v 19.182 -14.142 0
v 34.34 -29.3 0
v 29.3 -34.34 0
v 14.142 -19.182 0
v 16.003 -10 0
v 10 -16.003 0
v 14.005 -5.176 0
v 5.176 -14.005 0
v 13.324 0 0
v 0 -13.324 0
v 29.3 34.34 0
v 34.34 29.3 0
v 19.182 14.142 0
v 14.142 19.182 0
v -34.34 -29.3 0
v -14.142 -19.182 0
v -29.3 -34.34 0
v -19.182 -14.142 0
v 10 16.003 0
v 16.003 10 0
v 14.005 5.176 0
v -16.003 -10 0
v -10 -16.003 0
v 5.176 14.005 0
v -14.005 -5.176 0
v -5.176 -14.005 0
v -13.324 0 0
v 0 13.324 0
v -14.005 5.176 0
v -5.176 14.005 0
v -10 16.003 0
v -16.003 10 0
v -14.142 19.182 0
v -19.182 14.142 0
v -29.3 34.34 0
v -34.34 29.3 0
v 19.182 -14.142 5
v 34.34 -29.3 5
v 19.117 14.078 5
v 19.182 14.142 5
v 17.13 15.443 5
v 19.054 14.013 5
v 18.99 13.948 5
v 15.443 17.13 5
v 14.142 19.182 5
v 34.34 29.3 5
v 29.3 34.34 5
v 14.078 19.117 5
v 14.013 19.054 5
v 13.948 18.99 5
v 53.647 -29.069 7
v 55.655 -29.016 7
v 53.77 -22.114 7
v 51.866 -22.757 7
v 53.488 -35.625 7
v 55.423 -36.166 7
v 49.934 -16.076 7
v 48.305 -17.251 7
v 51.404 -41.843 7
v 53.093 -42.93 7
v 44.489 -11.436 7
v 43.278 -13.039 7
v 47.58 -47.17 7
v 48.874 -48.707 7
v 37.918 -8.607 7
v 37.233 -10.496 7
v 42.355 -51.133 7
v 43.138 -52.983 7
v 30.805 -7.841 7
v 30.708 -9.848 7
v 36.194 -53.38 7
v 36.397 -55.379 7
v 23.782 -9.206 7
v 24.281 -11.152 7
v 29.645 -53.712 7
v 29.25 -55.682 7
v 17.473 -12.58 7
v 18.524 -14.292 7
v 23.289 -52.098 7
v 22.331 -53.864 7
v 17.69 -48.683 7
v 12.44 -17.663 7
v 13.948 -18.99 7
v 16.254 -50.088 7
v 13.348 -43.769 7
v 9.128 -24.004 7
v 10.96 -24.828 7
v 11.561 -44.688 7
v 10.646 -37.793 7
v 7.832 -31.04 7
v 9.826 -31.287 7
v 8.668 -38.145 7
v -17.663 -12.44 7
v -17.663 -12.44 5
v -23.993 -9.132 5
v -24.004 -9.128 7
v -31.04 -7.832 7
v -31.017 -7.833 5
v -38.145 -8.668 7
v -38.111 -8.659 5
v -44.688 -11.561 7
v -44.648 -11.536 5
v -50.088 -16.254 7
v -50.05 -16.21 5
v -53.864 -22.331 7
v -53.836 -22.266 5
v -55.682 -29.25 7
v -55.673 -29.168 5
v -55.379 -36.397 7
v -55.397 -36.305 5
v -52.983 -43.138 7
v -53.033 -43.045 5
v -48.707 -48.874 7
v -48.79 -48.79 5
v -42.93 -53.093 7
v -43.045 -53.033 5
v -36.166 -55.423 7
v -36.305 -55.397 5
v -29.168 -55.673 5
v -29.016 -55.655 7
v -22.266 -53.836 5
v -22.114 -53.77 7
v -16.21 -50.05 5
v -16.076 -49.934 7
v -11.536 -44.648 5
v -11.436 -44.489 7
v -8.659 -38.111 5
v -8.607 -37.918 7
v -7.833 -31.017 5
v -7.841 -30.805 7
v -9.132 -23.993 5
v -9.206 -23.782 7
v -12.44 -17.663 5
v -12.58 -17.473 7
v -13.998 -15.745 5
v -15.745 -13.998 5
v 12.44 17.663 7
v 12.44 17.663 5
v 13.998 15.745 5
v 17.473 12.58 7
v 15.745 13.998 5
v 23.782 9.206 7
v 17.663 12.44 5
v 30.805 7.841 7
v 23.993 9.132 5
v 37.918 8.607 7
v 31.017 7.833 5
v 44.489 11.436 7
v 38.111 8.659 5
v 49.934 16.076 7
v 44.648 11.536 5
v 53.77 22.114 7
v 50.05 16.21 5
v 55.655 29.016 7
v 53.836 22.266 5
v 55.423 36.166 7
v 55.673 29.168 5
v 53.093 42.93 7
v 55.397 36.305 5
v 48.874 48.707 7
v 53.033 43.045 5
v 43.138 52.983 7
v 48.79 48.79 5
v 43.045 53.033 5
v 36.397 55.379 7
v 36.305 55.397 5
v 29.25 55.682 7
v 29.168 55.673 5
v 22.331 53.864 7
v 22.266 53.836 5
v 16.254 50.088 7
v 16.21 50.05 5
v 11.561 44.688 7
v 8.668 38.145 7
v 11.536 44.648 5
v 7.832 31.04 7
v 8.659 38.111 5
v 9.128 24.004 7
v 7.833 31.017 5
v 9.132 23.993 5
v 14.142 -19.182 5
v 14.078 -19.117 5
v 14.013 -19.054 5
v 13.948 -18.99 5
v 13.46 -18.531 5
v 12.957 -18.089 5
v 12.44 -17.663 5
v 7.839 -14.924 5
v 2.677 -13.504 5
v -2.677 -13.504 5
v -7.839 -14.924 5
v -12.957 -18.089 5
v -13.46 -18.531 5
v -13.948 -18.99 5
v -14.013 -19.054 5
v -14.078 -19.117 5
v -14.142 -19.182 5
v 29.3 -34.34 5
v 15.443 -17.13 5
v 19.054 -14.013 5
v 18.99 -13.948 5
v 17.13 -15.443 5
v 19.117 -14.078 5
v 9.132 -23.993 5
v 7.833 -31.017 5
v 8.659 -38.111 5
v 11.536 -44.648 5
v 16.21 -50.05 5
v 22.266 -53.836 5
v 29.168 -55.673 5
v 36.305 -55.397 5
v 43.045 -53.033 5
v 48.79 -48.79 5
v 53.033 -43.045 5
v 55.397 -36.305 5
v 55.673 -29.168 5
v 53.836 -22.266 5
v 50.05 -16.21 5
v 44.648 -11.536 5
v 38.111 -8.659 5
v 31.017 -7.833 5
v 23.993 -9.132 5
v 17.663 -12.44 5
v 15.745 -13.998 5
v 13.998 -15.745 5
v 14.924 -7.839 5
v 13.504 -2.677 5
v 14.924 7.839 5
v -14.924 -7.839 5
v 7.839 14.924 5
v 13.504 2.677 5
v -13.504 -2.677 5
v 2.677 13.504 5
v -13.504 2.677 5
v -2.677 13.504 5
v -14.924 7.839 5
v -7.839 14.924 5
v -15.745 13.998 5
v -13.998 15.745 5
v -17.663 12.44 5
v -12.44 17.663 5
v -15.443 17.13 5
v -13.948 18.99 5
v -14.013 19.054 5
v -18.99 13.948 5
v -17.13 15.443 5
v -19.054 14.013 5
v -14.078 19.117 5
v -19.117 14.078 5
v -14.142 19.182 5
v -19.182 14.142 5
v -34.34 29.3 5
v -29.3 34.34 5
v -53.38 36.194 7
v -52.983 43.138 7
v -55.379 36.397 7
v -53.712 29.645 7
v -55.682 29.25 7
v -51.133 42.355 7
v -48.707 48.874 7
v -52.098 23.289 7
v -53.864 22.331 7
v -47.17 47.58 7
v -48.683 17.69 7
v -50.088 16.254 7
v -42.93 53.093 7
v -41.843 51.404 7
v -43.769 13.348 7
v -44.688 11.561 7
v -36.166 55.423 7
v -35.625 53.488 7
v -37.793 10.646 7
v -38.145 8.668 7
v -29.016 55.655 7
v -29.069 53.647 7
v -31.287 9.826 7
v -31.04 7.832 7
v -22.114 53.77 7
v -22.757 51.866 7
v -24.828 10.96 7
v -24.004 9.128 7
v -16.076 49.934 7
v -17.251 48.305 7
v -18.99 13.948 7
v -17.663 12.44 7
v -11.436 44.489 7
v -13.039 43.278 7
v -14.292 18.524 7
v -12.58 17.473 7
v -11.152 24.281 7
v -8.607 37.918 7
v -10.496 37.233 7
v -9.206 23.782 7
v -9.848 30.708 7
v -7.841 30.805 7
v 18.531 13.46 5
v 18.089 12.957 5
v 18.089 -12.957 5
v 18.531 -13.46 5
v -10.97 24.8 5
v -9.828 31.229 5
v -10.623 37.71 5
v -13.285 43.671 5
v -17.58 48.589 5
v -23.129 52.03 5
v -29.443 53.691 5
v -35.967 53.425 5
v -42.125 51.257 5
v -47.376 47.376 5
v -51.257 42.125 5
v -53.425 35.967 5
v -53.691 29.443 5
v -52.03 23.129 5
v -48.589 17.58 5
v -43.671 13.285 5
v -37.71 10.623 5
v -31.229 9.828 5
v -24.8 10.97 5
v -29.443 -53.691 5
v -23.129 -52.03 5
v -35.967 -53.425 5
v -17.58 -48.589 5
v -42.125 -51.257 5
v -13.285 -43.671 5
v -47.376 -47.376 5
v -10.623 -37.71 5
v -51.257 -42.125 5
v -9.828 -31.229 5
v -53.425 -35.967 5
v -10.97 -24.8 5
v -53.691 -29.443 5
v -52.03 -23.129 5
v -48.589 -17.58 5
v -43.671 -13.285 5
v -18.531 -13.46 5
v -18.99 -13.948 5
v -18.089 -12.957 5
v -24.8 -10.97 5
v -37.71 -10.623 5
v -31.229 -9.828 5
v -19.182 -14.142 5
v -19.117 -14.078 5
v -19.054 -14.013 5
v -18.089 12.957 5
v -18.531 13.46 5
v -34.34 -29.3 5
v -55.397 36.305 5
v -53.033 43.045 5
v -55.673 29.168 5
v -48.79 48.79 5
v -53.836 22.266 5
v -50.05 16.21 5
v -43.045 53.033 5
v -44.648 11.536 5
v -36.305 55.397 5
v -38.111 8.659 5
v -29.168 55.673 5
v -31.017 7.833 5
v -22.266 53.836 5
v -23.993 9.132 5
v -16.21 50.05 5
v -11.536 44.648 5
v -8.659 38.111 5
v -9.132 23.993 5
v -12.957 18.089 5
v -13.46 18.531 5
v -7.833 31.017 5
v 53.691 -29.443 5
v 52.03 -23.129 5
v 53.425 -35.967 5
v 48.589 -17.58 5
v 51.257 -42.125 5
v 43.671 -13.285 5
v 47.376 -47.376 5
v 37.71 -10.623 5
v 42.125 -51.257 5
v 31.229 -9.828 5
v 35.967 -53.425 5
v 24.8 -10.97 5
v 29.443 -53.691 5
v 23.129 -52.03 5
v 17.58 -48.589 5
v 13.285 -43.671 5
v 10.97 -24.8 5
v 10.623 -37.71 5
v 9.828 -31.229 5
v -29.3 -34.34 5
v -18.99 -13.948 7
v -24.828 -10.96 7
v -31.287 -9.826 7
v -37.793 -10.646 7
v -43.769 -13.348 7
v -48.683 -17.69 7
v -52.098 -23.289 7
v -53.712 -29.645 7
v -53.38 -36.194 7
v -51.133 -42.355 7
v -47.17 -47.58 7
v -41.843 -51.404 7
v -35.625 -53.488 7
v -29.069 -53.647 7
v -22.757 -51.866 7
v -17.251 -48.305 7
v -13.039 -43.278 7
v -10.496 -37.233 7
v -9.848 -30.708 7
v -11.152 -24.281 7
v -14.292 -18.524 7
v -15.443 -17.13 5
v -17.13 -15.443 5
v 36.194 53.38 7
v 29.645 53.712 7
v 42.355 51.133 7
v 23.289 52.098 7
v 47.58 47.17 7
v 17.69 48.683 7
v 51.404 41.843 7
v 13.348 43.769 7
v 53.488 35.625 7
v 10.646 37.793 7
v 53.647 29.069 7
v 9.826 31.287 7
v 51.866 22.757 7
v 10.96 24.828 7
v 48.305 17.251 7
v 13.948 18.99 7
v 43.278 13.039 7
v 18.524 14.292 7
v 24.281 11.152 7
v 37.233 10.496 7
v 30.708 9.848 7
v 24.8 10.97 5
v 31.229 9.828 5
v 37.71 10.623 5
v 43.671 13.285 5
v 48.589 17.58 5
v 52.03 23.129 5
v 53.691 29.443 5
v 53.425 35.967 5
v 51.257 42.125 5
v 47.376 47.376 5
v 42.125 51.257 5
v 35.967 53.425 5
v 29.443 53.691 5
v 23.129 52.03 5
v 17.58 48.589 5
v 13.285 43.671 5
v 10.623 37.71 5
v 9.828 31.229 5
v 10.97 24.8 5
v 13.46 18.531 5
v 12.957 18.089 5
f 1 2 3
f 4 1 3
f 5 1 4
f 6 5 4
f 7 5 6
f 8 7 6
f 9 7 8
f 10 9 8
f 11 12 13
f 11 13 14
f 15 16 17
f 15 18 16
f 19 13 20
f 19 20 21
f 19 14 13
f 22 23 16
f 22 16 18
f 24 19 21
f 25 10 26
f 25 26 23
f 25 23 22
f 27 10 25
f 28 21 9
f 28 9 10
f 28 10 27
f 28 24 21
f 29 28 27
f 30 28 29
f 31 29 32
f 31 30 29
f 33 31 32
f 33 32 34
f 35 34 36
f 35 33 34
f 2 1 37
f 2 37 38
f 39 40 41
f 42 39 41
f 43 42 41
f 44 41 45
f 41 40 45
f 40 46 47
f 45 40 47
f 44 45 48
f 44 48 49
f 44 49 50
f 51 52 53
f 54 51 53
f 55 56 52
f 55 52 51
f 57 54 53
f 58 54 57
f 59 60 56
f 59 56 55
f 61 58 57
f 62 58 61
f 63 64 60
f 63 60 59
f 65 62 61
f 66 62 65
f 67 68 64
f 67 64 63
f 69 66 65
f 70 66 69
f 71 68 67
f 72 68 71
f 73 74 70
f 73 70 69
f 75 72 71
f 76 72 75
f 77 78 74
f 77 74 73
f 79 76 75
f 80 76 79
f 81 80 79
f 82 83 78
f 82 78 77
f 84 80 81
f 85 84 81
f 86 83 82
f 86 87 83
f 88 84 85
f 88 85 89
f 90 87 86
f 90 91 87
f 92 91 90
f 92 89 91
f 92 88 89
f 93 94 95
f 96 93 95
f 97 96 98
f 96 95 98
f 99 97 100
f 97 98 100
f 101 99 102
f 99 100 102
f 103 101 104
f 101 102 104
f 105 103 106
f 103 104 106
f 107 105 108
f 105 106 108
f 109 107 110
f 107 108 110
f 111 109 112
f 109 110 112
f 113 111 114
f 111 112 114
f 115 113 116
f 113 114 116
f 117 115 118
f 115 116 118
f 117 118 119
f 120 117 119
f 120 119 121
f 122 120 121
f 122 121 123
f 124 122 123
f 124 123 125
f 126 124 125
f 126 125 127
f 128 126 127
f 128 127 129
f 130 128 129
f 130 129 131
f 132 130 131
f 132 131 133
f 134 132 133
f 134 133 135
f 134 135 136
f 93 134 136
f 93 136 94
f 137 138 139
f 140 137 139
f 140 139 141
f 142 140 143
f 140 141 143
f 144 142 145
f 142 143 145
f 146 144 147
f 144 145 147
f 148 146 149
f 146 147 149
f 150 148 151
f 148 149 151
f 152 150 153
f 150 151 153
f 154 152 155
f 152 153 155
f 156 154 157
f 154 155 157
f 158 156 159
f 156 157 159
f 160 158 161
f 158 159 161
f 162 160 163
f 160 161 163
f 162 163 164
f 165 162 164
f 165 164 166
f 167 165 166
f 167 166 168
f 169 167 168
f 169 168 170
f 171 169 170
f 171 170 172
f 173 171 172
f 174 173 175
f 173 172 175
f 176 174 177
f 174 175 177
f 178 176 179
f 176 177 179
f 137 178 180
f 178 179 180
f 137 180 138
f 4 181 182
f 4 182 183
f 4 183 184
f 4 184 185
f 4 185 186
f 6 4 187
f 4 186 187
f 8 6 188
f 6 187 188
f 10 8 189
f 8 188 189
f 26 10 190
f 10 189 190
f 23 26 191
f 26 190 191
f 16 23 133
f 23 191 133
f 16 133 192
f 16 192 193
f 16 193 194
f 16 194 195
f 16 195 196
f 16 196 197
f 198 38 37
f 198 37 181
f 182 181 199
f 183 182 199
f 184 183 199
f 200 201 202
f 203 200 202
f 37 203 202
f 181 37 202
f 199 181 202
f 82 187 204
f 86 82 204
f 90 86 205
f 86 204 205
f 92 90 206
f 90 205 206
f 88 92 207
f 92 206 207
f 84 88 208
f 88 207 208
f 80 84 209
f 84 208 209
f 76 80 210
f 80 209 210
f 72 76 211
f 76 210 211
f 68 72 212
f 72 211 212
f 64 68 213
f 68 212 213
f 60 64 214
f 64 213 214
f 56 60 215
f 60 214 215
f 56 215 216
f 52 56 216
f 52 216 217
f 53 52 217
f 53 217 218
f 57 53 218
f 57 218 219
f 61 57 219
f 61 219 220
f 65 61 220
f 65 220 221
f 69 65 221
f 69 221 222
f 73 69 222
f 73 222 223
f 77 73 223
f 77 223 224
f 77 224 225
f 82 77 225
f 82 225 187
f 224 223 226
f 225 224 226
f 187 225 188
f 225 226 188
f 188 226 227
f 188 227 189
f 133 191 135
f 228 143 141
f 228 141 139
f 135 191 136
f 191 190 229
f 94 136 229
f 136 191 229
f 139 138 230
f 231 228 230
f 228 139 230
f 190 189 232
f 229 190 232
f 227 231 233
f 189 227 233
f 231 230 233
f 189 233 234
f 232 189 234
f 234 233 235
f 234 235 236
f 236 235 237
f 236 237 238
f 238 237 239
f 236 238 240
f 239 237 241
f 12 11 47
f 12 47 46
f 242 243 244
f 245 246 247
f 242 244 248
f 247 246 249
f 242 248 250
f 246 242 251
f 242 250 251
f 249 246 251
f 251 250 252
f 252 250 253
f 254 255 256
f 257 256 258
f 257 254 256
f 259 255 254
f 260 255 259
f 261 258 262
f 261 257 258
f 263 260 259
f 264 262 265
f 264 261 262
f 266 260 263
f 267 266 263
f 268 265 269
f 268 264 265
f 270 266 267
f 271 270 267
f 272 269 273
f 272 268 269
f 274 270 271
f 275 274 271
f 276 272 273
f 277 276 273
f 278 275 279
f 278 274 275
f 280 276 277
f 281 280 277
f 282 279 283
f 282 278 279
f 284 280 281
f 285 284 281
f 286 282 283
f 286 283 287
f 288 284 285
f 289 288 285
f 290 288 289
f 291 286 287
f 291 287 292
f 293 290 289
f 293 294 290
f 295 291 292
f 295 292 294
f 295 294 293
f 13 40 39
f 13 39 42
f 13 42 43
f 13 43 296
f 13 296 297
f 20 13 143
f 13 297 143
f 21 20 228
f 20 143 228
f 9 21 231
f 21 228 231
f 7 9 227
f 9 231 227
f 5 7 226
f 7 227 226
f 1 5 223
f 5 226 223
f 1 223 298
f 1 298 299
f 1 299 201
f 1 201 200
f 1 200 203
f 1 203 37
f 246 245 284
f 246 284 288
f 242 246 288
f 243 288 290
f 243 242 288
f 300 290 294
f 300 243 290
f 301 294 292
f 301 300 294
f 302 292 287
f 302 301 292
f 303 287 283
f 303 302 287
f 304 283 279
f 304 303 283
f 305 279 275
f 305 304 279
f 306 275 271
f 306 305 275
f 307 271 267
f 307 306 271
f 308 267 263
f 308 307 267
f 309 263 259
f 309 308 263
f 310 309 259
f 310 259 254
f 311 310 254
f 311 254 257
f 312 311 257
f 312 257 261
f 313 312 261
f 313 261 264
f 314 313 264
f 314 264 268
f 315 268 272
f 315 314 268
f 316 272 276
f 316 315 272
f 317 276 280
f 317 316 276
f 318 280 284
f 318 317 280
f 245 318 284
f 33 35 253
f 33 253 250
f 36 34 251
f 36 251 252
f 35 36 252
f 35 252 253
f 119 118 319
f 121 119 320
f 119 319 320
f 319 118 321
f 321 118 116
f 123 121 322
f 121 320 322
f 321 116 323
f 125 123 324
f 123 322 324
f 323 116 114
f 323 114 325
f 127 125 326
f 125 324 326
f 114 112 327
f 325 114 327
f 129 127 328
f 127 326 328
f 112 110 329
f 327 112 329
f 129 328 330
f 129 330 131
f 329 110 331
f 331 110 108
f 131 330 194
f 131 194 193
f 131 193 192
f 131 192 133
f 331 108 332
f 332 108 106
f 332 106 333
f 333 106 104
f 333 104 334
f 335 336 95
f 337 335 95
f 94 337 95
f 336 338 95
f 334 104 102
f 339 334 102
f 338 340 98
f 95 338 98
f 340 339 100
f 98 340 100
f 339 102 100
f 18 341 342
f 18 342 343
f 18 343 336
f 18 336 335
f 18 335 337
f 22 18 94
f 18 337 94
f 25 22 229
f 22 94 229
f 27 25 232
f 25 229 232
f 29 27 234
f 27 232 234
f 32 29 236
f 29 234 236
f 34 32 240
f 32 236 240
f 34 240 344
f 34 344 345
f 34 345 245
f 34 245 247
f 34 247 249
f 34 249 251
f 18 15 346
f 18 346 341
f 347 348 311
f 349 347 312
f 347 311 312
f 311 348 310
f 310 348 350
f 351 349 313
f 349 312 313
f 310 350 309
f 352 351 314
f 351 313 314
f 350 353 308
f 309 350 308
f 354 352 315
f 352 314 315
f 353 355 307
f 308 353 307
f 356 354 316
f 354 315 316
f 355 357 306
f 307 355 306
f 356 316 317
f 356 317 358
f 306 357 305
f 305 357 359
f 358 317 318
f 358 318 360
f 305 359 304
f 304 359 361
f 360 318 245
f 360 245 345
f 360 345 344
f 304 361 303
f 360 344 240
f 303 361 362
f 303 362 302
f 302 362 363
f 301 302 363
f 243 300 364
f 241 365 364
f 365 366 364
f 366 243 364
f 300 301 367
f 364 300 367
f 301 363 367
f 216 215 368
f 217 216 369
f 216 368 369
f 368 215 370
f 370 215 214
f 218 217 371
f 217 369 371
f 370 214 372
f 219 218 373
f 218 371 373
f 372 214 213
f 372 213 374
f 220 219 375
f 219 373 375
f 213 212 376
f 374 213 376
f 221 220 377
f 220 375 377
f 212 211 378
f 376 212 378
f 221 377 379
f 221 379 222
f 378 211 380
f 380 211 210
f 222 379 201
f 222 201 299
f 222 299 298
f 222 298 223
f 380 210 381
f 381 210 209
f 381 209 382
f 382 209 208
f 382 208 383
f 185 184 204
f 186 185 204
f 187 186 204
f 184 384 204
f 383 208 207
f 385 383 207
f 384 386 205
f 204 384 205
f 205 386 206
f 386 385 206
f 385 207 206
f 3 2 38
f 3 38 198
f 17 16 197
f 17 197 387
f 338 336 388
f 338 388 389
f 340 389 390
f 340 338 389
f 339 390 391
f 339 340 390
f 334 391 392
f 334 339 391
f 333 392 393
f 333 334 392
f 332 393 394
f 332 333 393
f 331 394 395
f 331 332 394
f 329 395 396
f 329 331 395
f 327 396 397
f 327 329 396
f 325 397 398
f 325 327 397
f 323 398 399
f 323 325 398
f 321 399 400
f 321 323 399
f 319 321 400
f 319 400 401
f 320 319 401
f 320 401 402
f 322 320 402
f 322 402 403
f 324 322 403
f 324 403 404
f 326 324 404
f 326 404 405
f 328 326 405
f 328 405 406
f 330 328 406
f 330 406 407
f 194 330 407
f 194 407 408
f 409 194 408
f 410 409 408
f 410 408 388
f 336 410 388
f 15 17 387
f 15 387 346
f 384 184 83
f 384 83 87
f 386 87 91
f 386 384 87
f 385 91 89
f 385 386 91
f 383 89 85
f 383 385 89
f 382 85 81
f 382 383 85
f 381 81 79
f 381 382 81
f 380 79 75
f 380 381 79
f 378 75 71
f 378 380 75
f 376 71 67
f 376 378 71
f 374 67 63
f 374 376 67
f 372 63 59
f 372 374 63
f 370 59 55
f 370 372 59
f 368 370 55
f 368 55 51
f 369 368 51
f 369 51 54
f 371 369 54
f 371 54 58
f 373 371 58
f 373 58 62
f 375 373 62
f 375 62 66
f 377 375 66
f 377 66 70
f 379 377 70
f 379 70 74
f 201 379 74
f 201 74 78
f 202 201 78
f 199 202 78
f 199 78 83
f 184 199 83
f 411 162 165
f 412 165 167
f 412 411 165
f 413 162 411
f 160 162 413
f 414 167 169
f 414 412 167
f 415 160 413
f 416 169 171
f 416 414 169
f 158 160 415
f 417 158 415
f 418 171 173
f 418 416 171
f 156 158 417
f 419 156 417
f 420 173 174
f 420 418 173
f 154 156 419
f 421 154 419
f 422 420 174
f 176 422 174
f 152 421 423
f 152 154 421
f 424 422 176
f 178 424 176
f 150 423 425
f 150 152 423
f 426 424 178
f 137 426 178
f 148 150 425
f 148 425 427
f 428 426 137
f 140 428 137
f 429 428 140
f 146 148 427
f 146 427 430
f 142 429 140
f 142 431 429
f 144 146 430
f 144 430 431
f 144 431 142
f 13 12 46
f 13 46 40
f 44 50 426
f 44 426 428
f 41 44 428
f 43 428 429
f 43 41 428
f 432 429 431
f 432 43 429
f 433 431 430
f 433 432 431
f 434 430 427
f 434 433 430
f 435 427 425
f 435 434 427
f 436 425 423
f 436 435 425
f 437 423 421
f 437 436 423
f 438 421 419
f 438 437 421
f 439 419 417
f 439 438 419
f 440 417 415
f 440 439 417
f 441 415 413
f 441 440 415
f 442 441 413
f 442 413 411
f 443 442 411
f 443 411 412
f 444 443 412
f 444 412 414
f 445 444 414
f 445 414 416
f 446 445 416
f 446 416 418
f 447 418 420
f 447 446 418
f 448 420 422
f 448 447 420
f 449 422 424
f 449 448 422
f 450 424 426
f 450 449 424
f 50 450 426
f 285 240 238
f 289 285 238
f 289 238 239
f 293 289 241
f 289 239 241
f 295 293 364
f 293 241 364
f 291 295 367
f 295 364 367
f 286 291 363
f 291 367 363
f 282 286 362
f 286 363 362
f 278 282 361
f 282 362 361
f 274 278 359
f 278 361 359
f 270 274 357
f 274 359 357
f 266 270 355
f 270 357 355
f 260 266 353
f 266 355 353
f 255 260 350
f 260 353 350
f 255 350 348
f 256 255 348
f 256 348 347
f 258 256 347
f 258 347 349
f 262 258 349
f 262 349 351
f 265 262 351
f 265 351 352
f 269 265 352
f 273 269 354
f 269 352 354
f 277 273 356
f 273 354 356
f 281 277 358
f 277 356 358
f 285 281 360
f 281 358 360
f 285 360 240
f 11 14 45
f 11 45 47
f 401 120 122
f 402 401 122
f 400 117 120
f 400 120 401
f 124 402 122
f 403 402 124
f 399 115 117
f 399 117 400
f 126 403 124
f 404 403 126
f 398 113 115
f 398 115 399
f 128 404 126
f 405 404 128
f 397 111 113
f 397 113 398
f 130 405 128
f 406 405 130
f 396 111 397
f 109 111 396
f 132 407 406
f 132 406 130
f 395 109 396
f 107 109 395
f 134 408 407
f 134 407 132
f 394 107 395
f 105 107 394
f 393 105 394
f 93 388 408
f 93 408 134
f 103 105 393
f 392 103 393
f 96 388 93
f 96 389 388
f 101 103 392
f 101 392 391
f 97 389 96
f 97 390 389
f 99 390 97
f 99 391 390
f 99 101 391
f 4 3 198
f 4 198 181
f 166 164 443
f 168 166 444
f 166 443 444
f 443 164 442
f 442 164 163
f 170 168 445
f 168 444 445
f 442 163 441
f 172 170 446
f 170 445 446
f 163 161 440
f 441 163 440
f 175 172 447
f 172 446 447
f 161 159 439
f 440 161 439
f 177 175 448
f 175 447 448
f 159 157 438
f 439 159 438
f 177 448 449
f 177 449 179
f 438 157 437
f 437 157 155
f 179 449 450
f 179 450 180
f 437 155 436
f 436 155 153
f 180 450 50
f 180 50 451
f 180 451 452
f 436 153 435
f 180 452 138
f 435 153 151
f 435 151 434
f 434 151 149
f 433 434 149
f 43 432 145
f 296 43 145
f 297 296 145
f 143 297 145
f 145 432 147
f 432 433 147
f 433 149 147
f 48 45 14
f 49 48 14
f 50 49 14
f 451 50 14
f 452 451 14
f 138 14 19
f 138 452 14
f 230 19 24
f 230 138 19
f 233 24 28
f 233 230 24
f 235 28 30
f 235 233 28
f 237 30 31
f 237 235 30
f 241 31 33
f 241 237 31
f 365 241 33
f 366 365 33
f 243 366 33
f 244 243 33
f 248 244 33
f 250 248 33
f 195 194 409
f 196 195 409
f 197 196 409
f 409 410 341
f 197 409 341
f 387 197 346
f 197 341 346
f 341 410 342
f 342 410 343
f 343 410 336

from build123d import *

# Parameters (mm, degrees)
BOSS_EXTRUDE1_DEPTH = 5
FILLET1_R           = 20
SKETCH3_R           = 24
SKETCH3_R_2         = 22
BOSS_EXTRUDE2_DEPTH = 2


with BuildPart() as part:
    # Sketch2 → Boss-Extrude1 (new body)
    with BuildSketch(Plane.XY):
        Polygon((0, 5.039474274), (29.300068016, 34.339542291), (34.339542291, 29.300068016), (5.039474274, 0), (34.339542291, -29.300068016), (29.300068016, -34.339542291), (0, -5.039474274), (-29.300068016, -34.339542291), (-34.339542291, -29.300068016), (-5.039474274, 0), (-34.339542291, 29.300068016), (-29.300068016, 34.339542291), align=None)
    extrude(amount=BOSS_EXTRUDE1_DEPTH)

    # Fillet1
    fillet1_edges = [part.edges().sort_by_distance(p)[0] for p in [
        (0, -5.039474274, 2.5),
        (-5.039474274, 0, 2.5),
        (0, 5.039474274, 2.5),
        (5.039474274, 0, 2.5),
    ]]
    fillet(fillet1_edges, radius=FILLET1_R)

    # Sketch3 → Boss-Extrude2 (add)
    # profile 1 of 4: a face of its own
    with BuildSketch(Plane.XY.offset(5)):
        with Locations(Location((-31.819805153, 31.819805153, 0), (0, 0, 306.147120123))):
            Circle(SKETCH3_R)
        with Locations(Location((-31.819805153, 31.819805153, 0), (0, 0, 305.673554169))):
            Circle(SKETCH3_R_2, mode=Mode.SUBTRACT)
    # profile 2 of 4: a face of its own
    with BuildSketch(Plane.XY.offset(5)):
        with Locations(Location((31.819805153, 31.819805153, 0), (0, 0, 216.147120123))):
            Circle(SKETCH3_R)
        with Locations(Location((31.819805153, 31.819805153, 0), (0, 0, 215.673554169))):
            Circle(SKETCH3_R_2, mode=Mode.SUBTRACT)
    # profile 3 of 4: a face of its own
    with BuildSketch(Plane.XY.offset(5)):
        with Locations(Location((31.819805153, -31.819805153, 0), (0, 0, 143.852879877))):
            Circle(SKETCH3_R)
        with Locations(Location((31.819805153, -31.819805153, 0), (0, 0, 144.326445831))):
            Circle(SKETCH3_R_2, mode=Mode.SUBTRACT)
    # profile 4 of 4: a face of its own
    with BuildSketch(Plane.XY.offset(5)):
        with Locations(Location((-31.819805153, -31.819805153, 0), (0, 0, 53.852879877))):
            Circle(SKETCH3_R)
        with Locations(Location((-31.819805153, -31.819805153, 0), (0, 0, 54.326445831))):
            Circle(SKETCH3_R_2, mode=Mode.SUBTRACT)
    extrude(amount=BOSS_EXTRUDE2_DEPTH)


solid = part.part
